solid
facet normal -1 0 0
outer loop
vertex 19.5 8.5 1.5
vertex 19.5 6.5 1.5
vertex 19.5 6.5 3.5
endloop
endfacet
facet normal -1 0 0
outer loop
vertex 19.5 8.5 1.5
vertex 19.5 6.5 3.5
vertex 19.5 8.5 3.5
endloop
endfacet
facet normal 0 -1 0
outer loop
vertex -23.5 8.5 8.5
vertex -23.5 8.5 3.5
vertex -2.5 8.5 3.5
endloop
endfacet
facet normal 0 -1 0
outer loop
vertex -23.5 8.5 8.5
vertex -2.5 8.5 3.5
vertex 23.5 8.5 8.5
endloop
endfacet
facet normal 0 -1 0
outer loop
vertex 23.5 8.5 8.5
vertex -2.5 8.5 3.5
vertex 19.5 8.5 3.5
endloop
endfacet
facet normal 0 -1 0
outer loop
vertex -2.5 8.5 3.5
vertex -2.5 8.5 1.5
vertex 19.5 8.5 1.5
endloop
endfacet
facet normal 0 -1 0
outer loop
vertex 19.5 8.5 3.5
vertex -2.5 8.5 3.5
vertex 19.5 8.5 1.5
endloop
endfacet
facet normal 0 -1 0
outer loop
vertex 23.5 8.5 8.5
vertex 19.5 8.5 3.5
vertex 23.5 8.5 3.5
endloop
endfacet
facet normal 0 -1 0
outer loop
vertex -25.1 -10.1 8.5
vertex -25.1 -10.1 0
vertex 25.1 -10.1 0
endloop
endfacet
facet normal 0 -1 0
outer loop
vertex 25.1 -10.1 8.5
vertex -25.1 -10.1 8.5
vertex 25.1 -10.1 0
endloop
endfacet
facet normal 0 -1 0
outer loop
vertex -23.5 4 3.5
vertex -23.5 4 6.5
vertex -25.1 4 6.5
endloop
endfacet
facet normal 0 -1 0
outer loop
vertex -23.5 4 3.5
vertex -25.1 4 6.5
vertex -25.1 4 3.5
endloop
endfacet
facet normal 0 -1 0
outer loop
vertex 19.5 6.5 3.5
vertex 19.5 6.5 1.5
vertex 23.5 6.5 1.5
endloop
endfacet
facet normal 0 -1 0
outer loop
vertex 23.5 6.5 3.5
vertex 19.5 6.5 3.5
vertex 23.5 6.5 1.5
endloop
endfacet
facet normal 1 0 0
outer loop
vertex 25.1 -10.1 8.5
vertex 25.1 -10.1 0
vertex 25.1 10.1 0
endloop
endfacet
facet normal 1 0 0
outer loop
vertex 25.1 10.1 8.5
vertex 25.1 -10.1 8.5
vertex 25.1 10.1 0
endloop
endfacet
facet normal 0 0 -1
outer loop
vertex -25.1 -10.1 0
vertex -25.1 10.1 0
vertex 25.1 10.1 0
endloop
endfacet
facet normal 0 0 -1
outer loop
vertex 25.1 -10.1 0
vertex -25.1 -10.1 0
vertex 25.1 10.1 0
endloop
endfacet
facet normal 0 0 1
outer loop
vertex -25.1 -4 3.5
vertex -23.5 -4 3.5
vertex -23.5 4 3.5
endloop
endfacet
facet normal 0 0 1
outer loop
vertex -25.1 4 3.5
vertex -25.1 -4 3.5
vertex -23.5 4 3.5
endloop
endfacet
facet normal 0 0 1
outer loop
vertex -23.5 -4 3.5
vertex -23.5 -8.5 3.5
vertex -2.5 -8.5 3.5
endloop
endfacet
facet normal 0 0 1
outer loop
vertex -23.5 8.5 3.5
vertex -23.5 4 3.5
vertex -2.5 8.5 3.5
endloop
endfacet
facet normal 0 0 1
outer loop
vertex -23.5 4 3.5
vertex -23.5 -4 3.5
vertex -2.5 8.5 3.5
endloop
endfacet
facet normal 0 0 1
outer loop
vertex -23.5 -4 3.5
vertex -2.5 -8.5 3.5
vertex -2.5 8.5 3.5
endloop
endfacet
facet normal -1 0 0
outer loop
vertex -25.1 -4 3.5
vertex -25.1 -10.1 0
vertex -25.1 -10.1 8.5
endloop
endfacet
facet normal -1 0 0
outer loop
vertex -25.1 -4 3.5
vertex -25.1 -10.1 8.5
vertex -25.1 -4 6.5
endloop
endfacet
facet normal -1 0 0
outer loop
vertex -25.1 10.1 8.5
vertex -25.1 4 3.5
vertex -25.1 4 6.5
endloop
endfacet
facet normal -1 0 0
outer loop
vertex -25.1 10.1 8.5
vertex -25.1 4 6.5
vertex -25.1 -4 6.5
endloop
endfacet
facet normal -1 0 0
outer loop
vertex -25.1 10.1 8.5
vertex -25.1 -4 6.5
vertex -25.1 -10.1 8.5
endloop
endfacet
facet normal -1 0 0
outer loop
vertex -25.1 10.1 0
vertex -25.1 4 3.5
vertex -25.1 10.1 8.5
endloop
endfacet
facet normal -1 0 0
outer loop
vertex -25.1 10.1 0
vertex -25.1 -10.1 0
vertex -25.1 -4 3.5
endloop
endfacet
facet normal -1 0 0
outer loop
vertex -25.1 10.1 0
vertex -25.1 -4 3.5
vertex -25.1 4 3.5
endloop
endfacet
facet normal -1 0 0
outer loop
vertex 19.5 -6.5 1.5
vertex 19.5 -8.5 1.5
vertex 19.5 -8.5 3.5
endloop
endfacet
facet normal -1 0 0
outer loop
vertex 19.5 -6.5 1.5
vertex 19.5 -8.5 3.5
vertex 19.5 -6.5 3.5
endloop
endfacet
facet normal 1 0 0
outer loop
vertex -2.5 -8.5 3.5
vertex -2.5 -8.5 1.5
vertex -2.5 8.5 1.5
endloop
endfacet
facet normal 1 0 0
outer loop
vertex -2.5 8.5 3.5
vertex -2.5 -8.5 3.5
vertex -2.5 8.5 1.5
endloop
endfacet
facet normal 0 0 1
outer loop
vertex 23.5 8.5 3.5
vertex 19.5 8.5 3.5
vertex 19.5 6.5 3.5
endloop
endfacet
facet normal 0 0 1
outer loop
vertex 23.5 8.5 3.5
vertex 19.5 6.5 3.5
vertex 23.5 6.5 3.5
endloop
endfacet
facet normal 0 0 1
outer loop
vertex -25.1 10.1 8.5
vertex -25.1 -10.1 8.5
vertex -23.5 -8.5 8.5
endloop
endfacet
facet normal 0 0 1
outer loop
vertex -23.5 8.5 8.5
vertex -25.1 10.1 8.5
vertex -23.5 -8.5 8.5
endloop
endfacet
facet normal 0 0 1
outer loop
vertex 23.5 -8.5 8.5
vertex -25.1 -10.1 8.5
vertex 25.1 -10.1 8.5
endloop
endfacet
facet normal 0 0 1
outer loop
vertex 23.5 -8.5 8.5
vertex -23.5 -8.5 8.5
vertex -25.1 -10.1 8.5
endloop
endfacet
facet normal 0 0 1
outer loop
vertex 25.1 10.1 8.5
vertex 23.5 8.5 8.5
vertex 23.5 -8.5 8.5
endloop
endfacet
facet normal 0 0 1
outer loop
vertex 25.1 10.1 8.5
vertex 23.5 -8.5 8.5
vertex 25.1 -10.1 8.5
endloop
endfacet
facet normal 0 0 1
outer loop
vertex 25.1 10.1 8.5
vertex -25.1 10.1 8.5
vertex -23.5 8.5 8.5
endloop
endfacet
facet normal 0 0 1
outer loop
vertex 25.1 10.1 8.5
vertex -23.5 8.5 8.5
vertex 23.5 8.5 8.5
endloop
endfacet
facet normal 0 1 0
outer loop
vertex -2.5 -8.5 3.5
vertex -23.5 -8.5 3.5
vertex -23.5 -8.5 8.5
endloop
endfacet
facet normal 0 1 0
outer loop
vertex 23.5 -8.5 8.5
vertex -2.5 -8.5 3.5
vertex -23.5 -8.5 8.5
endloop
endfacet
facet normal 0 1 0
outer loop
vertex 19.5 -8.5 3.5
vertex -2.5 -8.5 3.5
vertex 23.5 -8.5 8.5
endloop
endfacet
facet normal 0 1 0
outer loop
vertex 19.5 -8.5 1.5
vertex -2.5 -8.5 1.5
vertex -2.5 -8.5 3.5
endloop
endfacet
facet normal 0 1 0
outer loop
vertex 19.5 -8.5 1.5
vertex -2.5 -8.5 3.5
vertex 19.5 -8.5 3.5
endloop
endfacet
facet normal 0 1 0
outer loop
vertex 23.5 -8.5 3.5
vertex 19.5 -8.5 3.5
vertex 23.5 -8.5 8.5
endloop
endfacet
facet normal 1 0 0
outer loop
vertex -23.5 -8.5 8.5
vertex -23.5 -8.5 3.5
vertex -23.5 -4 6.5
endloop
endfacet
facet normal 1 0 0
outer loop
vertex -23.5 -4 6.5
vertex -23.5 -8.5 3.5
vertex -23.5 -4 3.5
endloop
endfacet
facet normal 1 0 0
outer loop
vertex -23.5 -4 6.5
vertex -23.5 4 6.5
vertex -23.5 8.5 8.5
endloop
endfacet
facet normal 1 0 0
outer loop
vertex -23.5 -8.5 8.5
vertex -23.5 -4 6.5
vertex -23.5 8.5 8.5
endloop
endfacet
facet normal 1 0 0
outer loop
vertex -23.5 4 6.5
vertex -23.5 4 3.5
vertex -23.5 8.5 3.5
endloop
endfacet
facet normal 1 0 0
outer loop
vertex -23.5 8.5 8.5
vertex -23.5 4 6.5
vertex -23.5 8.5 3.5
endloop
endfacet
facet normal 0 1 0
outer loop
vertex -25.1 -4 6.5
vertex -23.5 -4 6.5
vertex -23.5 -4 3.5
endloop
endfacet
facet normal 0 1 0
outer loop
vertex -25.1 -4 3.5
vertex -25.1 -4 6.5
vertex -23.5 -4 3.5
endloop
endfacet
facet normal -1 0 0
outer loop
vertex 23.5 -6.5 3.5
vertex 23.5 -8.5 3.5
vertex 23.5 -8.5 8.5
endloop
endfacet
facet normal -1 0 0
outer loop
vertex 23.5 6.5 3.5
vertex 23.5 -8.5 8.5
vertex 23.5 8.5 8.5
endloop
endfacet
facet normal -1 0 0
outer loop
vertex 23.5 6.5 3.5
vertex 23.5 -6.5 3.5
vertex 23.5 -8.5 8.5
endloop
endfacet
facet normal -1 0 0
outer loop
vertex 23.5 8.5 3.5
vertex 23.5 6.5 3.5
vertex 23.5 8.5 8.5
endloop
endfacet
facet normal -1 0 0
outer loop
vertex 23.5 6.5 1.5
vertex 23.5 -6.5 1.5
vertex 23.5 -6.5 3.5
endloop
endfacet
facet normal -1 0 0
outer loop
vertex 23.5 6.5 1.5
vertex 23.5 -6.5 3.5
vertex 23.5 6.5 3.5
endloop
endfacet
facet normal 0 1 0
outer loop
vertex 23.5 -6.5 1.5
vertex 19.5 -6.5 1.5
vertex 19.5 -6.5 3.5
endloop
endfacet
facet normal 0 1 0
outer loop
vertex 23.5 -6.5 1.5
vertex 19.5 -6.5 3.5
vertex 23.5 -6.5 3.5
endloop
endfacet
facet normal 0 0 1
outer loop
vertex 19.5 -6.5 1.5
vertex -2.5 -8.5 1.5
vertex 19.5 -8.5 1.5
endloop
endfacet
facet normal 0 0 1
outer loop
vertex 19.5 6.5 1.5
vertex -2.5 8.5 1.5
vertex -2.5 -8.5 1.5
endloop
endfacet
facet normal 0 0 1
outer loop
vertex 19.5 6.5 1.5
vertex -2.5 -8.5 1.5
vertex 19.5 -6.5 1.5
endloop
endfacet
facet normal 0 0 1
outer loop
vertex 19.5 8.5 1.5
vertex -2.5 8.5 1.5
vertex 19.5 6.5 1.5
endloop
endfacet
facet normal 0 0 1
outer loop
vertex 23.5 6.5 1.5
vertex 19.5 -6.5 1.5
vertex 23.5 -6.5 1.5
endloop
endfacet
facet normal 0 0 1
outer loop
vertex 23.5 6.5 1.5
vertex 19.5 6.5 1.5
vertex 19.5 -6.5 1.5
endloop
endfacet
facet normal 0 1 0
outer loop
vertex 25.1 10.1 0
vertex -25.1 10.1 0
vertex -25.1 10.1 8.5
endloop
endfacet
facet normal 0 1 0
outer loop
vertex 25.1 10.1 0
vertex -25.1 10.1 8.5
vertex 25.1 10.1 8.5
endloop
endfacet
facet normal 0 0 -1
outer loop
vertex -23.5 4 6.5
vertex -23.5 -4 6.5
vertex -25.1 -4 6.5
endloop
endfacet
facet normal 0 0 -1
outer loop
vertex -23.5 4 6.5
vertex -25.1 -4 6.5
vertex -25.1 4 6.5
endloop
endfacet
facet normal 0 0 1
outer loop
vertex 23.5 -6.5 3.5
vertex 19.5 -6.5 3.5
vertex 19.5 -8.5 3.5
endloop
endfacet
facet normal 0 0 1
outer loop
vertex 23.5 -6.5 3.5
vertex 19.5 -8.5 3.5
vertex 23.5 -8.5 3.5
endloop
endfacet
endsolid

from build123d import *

# Parameters (mm, degrees)
SKETCH1_W           = 47
SKETCH1_H           = 17
BOSS_EXTRUDE1_DEPTH = 1.5
SKETCH3_W           = 21
SKETCH3_H           = 17
SKETCH3_W_2         = 4
SKETCH3_H_2         = 2
BOSS_EXTRUDE3_DEPTH = 2
SKETCH2_W           = 50.2
SKETCH2_H           = 20.2
SKETCH2_W_2         = 47
SKETCH2_H_2         = 17
BOSS_EXTRUDE2_DEPTH = 8.5
SKETCH4_W           = 3
SKETCH4_H           = 8
CUT_EXTRUDE1_DEPTH  = 2.6


with BuildPart() as part:
    # Sketch1 → Boss-Extrude1 (new body)
    with BuildSketch(Plane.XY):
        Rectangle(SKETCH1_W, SKETCH1_H)
    extrude(amount=BOSS_EXTRUDE1_DEPTH)

    # Sketch3 → Boss-Extrude3 (add)
    with BuildSketch(Plane.XY.offset(1.5)):
        with Locations((-13, 0)):
            Rectangle(SKETCH3_W, SKETCH3_H)
        with Locations((21.5, 7.5)):
            Rectangle(SKETCH3_W_2, SKETCH3_H_2)
        with Locations((21.5, -7.5)):
            Rectangle(SKETCH3_W_2, SKETCH3_H_2)
    extrude(amount=BOSS_EXTRUDE3_DEPTH)

    # Sketch2 → Boss-Extrude2 (add)
    with BuildSketch(Plane.XY):
        Rectangle(SKETCH2_W, SKETCH2_H)
        Rectangle(SKETCH2_W_2, SKETCH2_H_2, mode=Mode.SUBTRACT)
    extrude(amount=BOSS_EXTRUDE2_DEPTH)

    # Sketch4 → Cut-Extrude1 (cut, through all)
    with BuildSketch(Plane(origin=(-23.5, 0, 0), x_dir=(0, 0, -1), z_dir=(1, 0, 0))):
        with Locations((-5, 0)):
            Rectangle(SKETCH4_W, SKETCH4_H)
    extrude(amount=-CUT_EXTRUDE1_DEPTH, mode=Mode.SUBTRACT)


solid = part.part
